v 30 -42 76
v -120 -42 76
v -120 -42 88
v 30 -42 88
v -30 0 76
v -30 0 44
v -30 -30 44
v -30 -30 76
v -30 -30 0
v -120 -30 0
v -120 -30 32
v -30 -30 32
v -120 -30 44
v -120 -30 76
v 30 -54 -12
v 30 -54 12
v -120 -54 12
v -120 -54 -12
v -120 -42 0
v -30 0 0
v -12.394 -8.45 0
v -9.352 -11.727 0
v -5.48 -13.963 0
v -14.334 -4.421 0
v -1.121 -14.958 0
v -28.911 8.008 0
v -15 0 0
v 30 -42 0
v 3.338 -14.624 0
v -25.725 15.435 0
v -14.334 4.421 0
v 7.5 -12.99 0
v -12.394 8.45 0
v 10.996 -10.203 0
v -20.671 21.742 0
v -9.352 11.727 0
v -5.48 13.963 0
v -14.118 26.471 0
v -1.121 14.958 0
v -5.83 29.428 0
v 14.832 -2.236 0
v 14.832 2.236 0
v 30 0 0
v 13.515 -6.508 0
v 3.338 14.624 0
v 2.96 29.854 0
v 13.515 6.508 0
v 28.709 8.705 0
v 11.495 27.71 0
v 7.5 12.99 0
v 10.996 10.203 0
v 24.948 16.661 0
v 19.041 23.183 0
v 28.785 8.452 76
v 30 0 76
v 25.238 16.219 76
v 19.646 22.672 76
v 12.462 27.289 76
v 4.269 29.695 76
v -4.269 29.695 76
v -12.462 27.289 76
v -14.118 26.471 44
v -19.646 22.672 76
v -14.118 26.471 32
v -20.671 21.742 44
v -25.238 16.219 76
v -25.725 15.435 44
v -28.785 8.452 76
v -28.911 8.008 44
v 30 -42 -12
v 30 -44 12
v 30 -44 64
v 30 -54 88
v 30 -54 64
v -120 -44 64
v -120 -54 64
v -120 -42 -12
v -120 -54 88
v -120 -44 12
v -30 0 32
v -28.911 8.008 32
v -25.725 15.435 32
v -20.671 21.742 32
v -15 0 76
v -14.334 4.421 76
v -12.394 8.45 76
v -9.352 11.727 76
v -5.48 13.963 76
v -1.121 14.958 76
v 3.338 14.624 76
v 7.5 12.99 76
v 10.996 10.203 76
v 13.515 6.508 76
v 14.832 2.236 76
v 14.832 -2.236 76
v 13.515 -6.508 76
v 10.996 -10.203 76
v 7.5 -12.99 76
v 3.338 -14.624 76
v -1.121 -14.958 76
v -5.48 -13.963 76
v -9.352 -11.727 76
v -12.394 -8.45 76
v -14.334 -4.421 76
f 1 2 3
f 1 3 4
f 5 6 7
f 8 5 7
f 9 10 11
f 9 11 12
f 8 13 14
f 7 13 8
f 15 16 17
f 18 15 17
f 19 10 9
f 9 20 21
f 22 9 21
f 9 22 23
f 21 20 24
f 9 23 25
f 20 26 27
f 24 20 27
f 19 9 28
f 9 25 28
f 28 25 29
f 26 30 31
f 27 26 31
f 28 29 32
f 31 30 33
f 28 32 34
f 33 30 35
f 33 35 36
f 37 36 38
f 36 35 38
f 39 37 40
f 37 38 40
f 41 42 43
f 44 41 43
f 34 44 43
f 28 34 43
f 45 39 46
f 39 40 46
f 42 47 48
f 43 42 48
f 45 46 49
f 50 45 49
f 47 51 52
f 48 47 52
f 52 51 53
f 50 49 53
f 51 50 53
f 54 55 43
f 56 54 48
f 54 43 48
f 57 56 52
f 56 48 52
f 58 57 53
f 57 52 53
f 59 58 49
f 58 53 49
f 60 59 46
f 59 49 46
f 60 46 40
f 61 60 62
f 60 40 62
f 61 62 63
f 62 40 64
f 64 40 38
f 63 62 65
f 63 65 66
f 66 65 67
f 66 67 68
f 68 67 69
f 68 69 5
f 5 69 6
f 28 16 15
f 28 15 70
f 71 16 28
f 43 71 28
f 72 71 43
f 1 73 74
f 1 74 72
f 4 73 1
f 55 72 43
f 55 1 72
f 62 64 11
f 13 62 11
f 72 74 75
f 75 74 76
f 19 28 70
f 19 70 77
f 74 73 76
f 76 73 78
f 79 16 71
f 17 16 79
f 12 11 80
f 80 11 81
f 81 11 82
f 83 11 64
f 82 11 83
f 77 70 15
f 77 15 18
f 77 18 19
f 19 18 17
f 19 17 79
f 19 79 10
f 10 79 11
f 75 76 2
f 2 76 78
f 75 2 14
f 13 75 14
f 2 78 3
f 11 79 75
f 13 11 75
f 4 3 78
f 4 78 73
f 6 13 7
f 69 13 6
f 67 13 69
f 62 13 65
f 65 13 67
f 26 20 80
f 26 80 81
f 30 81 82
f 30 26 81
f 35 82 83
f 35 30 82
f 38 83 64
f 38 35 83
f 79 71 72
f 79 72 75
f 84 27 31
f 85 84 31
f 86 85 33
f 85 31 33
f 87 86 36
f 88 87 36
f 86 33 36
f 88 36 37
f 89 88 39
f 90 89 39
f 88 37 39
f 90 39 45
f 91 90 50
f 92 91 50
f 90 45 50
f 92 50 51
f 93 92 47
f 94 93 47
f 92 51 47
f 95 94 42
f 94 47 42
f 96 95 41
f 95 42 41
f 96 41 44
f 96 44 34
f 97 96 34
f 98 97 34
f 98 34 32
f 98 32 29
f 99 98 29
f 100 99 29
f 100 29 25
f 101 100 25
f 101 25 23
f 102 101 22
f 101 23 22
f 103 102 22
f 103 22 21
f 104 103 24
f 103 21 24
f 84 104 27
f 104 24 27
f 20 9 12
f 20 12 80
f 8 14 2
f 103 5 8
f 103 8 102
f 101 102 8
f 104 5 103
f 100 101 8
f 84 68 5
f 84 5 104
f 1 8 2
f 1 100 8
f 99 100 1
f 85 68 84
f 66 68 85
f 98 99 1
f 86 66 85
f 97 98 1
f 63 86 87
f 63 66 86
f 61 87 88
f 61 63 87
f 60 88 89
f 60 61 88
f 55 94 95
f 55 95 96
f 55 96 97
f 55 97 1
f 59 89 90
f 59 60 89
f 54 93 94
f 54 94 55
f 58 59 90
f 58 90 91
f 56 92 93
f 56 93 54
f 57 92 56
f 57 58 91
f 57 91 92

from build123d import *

# Parameters (mm, degrees)
SKETCH2_W           = 90
SKETCH2_H           = 24
BOSS_EXTRUDE1_DEPTH = 76
SKETCH3_W           = 150
SKETCH3_H           = 12
BOSS_EXTRUDE2_DEPTH = 12
SKETCH4_W           = 150
SKETCH4_H           = 12
BOSS_EXTRUDE3_DEPTH = 12
SKETCH5_W           = 150
SKETCH5_H           = 52
CUT_EXTRUDE1_DEPTH  = 10
BOSS_EXTRUDE6_DEPTH = 44
CUT_EXTRUDE2_DEPTH  = 32


with BuildPart() as part:
    # Sketch2 → Boss-Extrude1 (new body)
    with BuildSketch(Plane.XY):
        with BuildLine():
            Line((30, -54), (30, 0))
            ThreePointArc((30, 0), (0, -30), (-30, 0))
            Line((-30, 0), (-30, -30))
            Line((-30, -30), (-30, -54))
            Line((-30, -54), (30, -54))
        make_face()
        with Locations((-75, -42)):
            Rectangle(SKETCH2_W, SKETCH2_H)
        with BuildLine():
            ThreePointArc((-15, 0), (0, 15), (15, 0))
            Line((15, 0), (30, 0))
            ThreePointArc((30, 0), (0, 30), (-30, 0))
            Line((-30, 0), (-15, 0))
        make_face()
        with BuildLine():
            Line((30, 0), (15, 0))
            ThreePointArc((15, 0), (0, -15), (-15, 0))
            Line((-15, 0), (-30, 0))
            ThreePointArc((-30, 0), (0, -30), (30, 0))
        make_face()
    extrude(amount=BOSS_EXTRUDE1_DEPTH)

    # Sketch3 → Boss-Extrude2 (add)
    with BuildSketch(Plane.XY.offset(76)):
        with Locations((-45, -48)):
            Rectangle(SKETCH3_W, SKETCH3_H)
    extrude(amount=BOSS_EXTRUDE2_DEPTH)

    # Sketch4 → Boss-Extrude3 (add)
    with BuildSketch(Plane(origin=(0, 0, 0), x_dir=(-1, 0, 0), z_dir=(0, 0, -1))):
        with Locations((45, -48)):
            Rectangle(SKETCH4_W, SKETCH4_H)
    extrude(amount=BOSS_EXTRUDE3_DEPTH)

    # Sketch5 → Cut-Extrude1 (cut)
    with BuildSketch(Plane(origin=(0, -54, 0), x_dir=(-1, 0, 0), z_dir=(0, -1, 0))):
        with Locations((45, -38)):
            Rectangle(SKETCH5_W, SKETCH5_H)
    extrude(amount=-CUT_EXTRUDE1_DEPTH, mode=Mode.SUBTRACT)

    # Sketch11 → Boss-Extrude6 (add)
    with BuildSketch(Plane.XY):
        with BuildLine():
            Line((-14.117647059, 26.470588235), (-120, -30))
            Line((-120, -30), (-30, -30))
            Line((-30, -30), (-30, 0))
            ThreePointArc((-30, 0), (-25.724787771, 15.434872663), (-14.117647059, 26.470588235))
        make_face()
    extrude(amount=BOSS_EXTRUDE6_DEPTH)

    # Sketch13 → Cut-Extrude2 (cut)
    with BuildSketch(Plane.XY):
        with BuildLine():
            Line((-30, -30), (-30, 0))
            ThreePointArc((-30, 0), (-25.724787771, 15.434872663), (-14.117647059, 26.470588235))
            Line((-14.117647059, 26.470588235), (-120, -30))
            Line((-120, -30), (-30, -30))
        make_face()
    extrude(amount=CUT_EXTRUDE2_DEPTH, mode=Mode.SUBTRACT)


solid = part.part
